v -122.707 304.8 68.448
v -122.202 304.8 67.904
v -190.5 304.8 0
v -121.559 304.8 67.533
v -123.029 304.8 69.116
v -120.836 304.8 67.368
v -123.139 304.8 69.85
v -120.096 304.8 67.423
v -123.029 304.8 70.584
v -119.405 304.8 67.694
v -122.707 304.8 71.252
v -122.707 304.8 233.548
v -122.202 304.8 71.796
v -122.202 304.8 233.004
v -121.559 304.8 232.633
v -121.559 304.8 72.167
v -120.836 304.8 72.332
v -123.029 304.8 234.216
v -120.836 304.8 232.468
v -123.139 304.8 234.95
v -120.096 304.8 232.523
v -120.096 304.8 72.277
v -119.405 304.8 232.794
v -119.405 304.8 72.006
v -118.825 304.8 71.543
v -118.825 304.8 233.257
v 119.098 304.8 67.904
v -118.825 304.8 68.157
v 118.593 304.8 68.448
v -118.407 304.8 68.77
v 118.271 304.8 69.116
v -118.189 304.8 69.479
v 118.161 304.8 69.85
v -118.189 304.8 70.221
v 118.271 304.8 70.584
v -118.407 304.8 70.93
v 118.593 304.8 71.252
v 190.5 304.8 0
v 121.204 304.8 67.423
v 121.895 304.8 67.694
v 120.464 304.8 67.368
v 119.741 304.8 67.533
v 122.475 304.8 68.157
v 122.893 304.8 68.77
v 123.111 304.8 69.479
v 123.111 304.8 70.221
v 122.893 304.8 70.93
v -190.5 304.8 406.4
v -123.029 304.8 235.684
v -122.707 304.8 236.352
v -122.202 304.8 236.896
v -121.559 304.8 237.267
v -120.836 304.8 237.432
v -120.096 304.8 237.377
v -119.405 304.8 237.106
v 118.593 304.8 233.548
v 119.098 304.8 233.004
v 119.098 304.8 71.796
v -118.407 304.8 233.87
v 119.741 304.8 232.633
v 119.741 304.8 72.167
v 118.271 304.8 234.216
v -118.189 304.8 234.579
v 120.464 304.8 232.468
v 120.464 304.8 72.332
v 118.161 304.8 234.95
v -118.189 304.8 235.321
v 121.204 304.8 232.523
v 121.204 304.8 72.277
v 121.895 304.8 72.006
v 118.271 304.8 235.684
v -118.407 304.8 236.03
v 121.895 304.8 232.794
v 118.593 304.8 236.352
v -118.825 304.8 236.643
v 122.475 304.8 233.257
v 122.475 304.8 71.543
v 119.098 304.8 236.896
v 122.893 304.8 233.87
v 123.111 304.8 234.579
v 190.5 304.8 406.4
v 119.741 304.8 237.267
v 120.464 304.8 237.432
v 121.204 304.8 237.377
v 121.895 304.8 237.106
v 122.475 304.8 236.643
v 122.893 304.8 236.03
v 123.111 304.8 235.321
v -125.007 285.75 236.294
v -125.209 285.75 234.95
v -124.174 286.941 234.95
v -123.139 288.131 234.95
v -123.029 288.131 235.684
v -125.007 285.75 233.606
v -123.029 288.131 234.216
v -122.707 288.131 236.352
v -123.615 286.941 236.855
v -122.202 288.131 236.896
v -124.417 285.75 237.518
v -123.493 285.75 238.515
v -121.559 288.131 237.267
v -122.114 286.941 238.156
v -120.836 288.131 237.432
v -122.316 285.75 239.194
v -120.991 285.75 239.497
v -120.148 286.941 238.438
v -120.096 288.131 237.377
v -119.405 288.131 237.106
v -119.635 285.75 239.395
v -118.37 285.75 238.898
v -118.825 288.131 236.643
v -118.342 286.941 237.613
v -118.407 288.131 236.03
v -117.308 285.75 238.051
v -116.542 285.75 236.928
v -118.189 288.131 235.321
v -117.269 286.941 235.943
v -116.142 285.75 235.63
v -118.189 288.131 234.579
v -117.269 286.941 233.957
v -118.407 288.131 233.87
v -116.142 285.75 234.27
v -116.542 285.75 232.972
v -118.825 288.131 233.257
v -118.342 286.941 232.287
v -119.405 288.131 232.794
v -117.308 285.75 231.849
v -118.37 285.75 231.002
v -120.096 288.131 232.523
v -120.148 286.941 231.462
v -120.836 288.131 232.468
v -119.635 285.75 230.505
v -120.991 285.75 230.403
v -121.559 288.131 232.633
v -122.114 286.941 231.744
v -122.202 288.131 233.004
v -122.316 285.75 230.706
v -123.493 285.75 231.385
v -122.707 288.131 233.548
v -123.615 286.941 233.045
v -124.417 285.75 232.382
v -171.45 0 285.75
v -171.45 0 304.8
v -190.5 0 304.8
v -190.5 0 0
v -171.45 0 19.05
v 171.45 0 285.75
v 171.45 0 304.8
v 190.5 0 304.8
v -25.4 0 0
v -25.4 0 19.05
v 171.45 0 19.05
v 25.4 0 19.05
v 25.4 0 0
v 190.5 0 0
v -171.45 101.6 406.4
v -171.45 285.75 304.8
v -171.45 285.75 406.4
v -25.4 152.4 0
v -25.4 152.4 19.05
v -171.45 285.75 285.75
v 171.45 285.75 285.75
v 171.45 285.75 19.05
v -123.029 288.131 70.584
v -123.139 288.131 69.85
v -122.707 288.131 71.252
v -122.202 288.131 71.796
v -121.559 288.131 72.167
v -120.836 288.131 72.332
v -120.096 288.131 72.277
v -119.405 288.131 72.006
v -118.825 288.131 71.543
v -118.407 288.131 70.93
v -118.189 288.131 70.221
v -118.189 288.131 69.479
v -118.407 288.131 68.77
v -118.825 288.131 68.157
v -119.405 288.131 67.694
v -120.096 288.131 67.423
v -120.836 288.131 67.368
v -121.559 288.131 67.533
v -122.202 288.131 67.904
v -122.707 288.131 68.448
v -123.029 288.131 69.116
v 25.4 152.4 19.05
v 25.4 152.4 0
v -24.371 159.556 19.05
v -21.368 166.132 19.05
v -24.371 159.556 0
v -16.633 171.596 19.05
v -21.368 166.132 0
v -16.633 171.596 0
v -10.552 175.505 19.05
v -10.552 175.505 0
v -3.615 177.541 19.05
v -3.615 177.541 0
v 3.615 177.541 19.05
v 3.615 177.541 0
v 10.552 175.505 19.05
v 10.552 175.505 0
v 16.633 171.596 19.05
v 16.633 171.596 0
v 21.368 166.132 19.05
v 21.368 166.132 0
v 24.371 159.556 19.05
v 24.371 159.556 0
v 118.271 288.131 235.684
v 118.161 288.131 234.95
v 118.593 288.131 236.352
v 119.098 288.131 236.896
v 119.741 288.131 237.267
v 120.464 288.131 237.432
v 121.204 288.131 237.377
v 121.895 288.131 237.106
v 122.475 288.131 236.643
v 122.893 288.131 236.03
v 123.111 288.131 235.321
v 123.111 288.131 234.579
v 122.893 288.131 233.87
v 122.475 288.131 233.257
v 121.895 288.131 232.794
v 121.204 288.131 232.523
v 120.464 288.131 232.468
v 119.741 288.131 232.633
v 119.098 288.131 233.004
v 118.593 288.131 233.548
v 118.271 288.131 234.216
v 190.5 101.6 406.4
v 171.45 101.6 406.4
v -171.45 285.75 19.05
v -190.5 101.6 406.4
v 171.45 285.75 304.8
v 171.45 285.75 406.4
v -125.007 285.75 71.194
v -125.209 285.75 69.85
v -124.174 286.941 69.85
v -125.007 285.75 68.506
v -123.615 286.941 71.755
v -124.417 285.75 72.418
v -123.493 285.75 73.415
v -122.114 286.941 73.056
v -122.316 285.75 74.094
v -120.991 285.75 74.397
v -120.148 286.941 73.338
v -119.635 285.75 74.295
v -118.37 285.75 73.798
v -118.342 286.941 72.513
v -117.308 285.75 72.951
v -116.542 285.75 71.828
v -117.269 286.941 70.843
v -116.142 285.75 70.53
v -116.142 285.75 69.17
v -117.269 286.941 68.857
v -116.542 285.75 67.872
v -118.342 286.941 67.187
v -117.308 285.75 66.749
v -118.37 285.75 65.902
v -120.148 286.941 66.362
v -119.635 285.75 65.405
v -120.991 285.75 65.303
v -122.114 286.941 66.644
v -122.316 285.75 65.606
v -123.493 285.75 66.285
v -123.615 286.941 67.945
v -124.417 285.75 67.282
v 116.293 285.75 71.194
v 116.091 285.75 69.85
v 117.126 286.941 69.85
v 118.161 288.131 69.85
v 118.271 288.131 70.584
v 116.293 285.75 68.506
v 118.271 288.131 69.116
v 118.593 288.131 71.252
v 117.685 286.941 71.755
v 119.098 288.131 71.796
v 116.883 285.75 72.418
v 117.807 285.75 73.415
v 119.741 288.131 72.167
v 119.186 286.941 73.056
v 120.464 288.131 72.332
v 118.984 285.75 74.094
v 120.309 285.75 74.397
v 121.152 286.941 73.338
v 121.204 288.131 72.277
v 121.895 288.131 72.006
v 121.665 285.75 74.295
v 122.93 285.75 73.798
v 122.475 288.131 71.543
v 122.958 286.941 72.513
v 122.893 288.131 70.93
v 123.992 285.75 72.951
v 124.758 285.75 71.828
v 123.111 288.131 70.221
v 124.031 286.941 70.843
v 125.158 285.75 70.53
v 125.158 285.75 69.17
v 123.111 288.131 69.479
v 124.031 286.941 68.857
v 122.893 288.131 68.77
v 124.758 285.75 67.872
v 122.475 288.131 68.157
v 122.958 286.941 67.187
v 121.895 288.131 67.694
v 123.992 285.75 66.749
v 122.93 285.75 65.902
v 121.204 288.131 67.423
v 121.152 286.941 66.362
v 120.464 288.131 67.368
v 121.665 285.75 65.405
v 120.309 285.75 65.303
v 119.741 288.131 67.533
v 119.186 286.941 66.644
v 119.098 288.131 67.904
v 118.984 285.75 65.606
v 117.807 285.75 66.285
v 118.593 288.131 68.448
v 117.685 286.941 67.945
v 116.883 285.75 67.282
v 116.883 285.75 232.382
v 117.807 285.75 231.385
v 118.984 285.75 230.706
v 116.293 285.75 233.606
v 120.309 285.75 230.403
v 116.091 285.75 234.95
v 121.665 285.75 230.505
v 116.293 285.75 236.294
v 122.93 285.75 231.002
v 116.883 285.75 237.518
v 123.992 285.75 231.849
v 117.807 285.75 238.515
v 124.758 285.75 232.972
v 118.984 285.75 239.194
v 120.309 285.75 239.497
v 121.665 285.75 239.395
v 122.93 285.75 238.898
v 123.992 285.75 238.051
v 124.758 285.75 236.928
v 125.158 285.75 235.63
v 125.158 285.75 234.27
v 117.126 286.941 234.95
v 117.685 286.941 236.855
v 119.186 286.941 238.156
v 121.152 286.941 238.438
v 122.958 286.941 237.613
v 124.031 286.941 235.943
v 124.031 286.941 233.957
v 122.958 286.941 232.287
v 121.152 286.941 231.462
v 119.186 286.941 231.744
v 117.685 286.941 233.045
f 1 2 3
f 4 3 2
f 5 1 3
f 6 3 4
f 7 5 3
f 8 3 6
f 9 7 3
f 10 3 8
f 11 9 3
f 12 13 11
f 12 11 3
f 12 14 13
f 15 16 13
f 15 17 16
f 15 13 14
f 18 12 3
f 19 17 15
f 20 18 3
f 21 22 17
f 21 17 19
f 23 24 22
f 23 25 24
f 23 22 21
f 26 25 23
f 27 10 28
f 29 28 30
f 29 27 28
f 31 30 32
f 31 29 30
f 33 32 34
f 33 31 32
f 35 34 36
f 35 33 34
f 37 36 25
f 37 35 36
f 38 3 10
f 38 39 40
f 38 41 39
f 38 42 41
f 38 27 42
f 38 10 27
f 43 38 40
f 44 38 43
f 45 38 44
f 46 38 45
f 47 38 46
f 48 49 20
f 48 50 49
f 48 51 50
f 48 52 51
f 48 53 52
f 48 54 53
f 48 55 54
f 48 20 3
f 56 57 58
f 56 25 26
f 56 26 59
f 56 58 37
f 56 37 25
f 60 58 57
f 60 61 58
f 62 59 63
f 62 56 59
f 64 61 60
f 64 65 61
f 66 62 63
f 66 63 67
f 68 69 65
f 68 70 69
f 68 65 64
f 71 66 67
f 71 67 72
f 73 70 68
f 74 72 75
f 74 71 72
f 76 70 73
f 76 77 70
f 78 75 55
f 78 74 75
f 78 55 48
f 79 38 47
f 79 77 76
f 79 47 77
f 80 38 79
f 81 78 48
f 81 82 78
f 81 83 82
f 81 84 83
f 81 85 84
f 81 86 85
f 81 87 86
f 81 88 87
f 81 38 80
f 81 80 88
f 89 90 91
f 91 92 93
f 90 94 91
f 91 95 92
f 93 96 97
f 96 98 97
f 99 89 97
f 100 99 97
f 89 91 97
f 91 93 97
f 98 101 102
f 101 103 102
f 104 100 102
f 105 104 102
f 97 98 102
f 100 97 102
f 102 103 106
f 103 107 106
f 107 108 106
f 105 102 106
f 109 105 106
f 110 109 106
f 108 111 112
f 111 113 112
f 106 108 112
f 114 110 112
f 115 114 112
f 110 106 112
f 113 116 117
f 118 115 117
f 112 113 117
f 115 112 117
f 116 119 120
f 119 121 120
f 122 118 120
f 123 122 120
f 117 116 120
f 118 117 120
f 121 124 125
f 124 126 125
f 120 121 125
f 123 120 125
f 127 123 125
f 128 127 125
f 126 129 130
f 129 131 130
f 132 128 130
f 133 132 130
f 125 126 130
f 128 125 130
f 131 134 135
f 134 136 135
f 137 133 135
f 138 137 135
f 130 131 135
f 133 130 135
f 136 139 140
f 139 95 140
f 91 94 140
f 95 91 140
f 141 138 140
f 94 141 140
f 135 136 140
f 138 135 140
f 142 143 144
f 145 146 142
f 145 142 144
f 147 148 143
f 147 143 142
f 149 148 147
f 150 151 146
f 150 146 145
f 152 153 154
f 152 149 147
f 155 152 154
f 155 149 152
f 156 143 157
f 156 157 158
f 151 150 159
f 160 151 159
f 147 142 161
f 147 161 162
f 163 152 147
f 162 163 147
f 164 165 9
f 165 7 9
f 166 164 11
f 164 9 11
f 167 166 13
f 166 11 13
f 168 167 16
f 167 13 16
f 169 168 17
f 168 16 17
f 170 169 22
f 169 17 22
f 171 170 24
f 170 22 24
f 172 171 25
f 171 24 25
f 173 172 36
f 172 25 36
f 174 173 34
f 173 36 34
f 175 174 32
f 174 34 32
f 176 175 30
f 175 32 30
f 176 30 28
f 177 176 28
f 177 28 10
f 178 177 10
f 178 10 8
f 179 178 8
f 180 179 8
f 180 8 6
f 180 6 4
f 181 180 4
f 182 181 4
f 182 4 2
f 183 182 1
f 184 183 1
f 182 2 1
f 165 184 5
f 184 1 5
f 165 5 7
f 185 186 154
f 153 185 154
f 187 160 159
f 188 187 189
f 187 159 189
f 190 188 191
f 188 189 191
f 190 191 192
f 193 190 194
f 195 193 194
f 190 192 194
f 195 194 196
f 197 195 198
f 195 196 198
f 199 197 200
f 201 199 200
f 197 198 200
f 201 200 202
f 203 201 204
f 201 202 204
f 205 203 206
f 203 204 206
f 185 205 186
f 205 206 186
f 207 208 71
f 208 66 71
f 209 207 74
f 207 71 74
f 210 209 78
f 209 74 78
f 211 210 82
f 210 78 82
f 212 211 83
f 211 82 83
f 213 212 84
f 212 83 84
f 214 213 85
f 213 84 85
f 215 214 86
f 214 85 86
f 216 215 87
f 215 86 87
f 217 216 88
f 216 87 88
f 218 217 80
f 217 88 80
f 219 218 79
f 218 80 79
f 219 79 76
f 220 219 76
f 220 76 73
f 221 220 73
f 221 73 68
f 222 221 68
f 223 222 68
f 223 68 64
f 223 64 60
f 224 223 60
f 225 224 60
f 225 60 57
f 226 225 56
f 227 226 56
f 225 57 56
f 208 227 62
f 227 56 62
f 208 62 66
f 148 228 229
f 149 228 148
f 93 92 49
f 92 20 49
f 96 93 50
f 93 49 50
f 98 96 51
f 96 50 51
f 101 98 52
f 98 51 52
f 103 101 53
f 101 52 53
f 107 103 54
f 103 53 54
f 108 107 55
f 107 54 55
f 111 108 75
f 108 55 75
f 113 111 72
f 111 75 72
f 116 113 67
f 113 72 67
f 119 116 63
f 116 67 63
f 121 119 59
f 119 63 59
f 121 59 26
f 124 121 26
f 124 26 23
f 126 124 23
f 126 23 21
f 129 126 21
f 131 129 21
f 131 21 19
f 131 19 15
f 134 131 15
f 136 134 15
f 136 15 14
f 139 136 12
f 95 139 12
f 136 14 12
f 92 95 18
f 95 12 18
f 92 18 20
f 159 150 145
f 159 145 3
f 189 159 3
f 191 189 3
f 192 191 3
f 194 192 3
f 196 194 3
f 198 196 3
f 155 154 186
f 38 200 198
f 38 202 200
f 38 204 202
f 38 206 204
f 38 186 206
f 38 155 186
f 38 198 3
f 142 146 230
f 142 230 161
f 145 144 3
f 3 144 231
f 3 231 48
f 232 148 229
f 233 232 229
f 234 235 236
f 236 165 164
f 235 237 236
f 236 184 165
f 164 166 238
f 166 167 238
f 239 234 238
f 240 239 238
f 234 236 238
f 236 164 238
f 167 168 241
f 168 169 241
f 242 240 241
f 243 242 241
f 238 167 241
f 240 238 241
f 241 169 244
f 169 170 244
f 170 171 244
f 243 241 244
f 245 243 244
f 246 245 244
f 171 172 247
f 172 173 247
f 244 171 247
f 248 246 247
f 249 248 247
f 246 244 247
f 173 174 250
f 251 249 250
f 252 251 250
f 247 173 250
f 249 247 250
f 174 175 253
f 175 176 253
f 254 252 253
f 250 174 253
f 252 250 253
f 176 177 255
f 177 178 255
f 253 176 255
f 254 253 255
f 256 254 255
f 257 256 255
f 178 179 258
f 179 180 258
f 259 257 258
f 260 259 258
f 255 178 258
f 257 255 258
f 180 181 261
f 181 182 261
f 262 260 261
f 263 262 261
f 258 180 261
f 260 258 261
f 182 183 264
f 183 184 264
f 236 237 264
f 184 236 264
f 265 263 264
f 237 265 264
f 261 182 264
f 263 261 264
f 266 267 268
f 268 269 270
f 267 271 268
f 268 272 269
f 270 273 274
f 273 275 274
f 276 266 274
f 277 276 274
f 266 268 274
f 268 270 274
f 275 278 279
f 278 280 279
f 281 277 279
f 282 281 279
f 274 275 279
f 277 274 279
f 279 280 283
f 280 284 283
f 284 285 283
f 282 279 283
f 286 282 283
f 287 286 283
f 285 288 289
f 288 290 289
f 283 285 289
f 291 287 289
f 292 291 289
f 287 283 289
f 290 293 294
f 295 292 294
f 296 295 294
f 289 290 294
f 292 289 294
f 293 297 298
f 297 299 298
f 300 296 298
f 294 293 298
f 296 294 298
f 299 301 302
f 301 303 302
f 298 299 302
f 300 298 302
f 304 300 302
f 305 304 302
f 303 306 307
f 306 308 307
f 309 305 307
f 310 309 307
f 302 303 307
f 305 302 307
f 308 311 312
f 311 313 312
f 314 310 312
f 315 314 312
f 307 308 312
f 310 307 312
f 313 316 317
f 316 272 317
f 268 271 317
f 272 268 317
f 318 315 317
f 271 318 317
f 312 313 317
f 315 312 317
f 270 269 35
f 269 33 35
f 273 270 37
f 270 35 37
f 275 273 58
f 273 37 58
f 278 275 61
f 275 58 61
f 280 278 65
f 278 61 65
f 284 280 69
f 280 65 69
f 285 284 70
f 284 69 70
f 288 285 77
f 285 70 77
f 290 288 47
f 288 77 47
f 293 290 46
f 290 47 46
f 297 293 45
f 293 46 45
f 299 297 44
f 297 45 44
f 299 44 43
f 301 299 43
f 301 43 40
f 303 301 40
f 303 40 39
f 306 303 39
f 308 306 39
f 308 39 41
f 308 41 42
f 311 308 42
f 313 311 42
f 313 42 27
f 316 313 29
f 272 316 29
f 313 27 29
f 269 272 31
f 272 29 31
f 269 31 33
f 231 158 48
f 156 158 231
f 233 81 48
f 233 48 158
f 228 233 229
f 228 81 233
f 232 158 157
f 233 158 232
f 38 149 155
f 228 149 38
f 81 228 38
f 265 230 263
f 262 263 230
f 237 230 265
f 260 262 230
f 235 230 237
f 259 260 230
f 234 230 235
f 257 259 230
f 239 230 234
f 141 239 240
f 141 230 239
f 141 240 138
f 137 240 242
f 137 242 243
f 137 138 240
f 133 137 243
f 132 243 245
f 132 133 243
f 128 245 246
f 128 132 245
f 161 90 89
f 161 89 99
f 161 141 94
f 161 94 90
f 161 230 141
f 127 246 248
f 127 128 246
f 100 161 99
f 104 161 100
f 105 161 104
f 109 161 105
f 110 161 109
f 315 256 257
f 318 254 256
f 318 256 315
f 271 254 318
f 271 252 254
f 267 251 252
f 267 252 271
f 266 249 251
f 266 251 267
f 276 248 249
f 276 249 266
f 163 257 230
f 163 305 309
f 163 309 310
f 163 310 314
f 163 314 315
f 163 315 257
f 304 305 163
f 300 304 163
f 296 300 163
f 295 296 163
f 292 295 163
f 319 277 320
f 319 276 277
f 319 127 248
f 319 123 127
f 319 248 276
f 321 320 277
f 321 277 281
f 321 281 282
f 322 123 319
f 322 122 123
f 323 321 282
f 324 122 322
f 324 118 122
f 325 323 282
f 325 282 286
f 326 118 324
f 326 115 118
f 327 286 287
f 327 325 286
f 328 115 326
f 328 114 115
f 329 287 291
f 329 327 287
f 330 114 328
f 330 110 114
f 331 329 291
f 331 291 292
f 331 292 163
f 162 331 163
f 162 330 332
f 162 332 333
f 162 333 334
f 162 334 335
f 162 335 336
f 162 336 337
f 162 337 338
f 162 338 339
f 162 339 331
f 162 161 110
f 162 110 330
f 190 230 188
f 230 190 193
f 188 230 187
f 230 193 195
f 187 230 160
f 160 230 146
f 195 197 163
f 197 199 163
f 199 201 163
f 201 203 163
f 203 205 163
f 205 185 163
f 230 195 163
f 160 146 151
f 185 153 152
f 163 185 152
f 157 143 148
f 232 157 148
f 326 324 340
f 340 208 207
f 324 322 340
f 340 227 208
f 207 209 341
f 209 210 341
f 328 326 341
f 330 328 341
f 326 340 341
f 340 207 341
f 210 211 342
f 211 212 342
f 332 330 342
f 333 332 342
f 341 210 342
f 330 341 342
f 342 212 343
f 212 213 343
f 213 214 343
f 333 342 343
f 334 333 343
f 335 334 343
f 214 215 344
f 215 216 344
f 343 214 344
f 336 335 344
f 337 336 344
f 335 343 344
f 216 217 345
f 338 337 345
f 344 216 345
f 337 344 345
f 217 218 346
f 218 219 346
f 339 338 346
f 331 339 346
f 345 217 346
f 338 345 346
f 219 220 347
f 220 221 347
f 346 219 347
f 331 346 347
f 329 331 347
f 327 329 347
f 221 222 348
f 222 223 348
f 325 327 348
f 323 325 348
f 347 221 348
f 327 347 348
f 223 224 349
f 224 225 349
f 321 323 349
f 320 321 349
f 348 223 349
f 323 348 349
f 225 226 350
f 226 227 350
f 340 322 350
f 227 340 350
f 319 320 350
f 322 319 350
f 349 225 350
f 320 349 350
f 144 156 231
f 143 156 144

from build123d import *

# Parameters (mm, degrees)
F1_DEPTH       = 190.5
F2_W           = 342.9
F2_H           = 101.6
F3_DEPTH       = 285.75
F4_W           = 342.9
F4_H           = 266.7
F5_DEPTH       = 285.75
F7_DEPTH       = 19.05
F9_D           = 4.9784
F9_CSINK_D     = 9.1186
F9_CSINK_ANGLE = 82


with BuildPart() as f1:
    # F0 (on Right) → F1 (new body, symmetric)
    with BuildSketch(Plane.YZ):
        Polygon((0, 304.8), (0, 0), (304.8, 0), (304.8, 406.4), (101.6, 406.4), align=None)
    extrude(amount=F1_DEPTH, both=True)

    # F2 (on face) → F3 (cut, through all)
    with BuildSketch(Plane.XZ):
        with Locations((0, 355.6)):
            Rectangle(F2_W, F2_H)
    extrude(amount=-F3_DEPTH, mode=Mode.SUBTRACT)

    # F4 (on face) → F5 (cut, through all)
    with BuildSketch(Plane.XZ):
        with Locations((0, 152.4)):
            Rectangle(F4_W, F4_H)
    extrude(amount=-F5_DEPTH, mode=Mode.SUBTRACT)

    # F6 (on face) → F7 (cut, through all)
    with BuildSketch(Plane(origin=(0, 0, 0), x_dir=(1, 0, 0), z_dir=(0, 0, -1))):
        with BuildLine():
            Line((25.4, 0), (-25.4, 0))
            Line((-25.4, 0), (-25.4, -152.4))
            ThreePointArc((-25.4, -152.4), (0, -177.8), (25.4, -152.4))
            Line((25.4, -152.4), (25.4, 0))
        make_face()
    extrude(amount=-F7_DEPTH, mode=Mode.SUBTRACT)

    # F9 (through all)
    with Locations(Plane.XZ.offset(-285.75)):
        with Locations((120.65, 69.85), (120.65, 234.95), (-120.65, 234.95), (-120.65, 69.85)):
            CounterSinkHole(F9_D / 2, F9_CSINK_D / 2, counter_sink_angle=F9_CSINK_ANGLE)


solid = f1.part
